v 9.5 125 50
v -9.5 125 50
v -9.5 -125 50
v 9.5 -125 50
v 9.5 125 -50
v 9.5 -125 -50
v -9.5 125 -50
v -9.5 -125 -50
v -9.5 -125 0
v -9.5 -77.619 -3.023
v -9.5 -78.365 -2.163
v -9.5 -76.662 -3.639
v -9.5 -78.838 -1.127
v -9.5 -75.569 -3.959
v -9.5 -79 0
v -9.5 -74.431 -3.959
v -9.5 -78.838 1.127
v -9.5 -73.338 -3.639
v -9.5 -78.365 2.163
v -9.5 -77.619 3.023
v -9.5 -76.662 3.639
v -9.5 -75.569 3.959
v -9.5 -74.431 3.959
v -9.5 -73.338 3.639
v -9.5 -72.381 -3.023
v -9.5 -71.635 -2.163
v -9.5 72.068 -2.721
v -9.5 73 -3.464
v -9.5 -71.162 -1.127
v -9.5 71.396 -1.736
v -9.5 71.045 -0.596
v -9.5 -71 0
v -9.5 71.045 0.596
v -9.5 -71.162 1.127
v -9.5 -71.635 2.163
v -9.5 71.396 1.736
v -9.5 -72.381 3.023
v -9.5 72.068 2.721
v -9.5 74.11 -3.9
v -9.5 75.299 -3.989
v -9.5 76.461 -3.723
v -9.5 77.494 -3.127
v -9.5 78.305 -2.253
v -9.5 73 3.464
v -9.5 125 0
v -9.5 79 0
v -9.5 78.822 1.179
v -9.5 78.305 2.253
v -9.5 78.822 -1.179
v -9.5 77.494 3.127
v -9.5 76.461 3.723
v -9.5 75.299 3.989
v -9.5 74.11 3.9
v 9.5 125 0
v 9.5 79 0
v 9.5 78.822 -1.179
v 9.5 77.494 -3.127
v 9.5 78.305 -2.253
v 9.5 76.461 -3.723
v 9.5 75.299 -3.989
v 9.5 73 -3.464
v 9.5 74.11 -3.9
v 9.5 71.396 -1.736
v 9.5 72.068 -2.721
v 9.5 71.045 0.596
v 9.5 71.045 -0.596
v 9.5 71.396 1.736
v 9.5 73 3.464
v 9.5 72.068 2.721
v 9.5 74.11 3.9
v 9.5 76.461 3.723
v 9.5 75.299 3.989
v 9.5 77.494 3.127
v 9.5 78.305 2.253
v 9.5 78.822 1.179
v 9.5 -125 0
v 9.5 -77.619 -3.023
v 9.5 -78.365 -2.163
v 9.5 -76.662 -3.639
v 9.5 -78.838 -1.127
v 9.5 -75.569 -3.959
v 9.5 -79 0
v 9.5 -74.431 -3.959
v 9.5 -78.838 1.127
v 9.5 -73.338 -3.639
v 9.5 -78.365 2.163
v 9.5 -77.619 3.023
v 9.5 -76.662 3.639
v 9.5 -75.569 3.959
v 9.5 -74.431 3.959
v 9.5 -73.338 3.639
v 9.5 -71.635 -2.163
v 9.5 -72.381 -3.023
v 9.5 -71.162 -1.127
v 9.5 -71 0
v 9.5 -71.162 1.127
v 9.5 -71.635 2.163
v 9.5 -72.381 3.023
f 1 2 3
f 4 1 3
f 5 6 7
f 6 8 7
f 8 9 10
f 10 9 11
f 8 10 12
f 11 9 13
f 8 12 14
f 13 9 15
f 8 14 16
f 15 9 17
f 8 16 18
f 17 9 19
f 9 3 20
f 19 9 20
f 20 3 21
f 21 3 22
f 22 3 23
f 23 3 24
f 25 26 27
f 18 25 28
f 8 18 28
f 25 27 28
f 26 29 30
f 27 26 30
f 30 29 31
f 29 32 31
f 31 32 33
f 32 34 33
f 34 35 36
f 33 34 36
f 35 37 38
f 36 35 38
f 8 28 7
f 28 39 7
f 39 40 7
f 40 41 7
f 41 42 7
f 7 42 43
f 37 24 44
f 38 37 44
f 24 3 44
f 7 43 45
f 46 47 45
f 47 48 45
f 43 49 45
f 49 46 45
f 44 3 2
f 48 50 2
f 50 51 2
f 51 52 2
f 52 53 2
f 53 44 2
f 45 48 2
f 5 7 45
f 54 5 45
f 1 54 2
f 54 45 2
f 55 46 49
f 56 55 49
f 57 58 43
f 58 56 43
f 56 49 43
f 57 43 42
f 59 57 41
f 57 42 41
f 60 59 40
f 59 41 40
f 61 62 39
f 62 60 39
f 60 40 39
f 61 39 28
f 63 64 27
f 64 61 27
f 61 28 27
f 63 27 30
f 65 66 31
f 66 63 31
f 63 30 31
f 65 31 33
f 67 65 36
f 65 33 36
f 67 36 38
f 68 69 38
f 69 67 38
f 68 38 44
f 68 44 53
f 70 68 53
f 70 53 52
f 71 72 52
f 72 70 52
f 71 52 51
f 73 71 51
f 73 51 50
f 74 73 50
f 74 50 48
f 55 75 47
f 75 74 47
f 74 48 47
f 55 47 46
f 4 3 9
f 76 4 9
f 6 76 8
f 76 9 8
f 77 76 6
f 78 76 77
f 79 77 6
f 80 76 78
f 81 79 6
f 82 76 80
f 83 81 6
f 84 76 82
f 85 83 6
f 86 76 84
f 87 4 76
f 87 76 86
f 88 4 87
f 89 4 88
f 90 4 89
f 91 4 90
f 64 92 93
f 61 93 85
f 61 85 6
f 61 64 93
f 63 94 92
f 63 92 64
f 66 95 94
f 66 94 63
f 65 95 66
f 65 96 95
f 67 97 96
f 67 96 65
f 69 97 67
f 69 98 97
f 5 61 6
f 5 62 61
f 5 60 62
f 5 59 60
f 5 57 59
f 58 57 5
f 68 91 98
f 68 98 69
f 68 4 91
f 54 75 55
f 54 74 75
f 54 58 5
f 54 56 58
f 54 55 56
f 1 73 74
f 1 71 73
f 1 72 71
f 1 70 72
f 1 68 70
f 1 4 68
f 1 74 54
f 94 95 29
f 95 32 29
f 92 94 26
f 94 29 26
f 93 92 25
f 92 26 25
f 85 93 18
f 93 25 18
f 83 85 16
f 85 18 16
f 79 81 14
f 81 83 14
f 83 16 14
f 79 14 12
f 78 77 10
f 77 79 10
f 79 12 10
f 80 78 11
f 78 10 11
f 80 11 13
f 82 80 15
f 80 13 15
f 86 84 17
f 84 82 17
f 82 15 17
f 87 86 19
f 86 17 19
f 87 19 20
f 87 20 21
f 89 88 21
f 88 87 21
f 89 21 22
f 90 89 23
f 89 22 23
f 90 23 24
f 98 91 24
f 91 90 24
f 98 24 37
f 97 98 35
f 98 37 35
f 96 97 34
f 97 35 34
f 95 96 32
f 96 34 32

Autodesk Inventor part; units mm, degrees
ref_plane "YZ Plane" through (0, 0, 0) normal (1, 0, 0) x (0, 1, 0)
ref_plane "XZ Plane" through (0, 0, 0) normal (0, 1, 0) x (-1, 0, 0)
ref_plane "XY Plane" through (0, 0, 0) normal (0, 0, 1) x (1, 0, 0)
sketch "Sketch1" plane through (0, 0, 0) normal (1, 0, 0) x (0, 1, 0)
  line L0 (125, 50) -> (-125, 50)
  line L1 (-125, 50) -> (-125, -50)
  line L2 (-125, -50) -> (125, -50)
  line L3 (125, -50) -> (125, 50)
  line L4 (125, 50) -> (-125, -50) construction
  line L5 (-125, 50) -> (125, -50) construction
  line L6 (125, 0) -> (75, 0)
  line L7 (-125, 0) -> (-75, 0)
  circle A0 centre (-75, 0) radius 4
  circle A1 centre (75, 0) radius 4
  point P0 (0, 0)
  dimension "d0" = 250
  dimension "d1" = 100
  dimension "d2" = 50
  dimension "d3" = 50
  dimension "d4" = 8
  dimension "d5" = 8
extrude "Extrusion1" add sketch "Sketch1" along normal mid plane 19
properties part number "H"
